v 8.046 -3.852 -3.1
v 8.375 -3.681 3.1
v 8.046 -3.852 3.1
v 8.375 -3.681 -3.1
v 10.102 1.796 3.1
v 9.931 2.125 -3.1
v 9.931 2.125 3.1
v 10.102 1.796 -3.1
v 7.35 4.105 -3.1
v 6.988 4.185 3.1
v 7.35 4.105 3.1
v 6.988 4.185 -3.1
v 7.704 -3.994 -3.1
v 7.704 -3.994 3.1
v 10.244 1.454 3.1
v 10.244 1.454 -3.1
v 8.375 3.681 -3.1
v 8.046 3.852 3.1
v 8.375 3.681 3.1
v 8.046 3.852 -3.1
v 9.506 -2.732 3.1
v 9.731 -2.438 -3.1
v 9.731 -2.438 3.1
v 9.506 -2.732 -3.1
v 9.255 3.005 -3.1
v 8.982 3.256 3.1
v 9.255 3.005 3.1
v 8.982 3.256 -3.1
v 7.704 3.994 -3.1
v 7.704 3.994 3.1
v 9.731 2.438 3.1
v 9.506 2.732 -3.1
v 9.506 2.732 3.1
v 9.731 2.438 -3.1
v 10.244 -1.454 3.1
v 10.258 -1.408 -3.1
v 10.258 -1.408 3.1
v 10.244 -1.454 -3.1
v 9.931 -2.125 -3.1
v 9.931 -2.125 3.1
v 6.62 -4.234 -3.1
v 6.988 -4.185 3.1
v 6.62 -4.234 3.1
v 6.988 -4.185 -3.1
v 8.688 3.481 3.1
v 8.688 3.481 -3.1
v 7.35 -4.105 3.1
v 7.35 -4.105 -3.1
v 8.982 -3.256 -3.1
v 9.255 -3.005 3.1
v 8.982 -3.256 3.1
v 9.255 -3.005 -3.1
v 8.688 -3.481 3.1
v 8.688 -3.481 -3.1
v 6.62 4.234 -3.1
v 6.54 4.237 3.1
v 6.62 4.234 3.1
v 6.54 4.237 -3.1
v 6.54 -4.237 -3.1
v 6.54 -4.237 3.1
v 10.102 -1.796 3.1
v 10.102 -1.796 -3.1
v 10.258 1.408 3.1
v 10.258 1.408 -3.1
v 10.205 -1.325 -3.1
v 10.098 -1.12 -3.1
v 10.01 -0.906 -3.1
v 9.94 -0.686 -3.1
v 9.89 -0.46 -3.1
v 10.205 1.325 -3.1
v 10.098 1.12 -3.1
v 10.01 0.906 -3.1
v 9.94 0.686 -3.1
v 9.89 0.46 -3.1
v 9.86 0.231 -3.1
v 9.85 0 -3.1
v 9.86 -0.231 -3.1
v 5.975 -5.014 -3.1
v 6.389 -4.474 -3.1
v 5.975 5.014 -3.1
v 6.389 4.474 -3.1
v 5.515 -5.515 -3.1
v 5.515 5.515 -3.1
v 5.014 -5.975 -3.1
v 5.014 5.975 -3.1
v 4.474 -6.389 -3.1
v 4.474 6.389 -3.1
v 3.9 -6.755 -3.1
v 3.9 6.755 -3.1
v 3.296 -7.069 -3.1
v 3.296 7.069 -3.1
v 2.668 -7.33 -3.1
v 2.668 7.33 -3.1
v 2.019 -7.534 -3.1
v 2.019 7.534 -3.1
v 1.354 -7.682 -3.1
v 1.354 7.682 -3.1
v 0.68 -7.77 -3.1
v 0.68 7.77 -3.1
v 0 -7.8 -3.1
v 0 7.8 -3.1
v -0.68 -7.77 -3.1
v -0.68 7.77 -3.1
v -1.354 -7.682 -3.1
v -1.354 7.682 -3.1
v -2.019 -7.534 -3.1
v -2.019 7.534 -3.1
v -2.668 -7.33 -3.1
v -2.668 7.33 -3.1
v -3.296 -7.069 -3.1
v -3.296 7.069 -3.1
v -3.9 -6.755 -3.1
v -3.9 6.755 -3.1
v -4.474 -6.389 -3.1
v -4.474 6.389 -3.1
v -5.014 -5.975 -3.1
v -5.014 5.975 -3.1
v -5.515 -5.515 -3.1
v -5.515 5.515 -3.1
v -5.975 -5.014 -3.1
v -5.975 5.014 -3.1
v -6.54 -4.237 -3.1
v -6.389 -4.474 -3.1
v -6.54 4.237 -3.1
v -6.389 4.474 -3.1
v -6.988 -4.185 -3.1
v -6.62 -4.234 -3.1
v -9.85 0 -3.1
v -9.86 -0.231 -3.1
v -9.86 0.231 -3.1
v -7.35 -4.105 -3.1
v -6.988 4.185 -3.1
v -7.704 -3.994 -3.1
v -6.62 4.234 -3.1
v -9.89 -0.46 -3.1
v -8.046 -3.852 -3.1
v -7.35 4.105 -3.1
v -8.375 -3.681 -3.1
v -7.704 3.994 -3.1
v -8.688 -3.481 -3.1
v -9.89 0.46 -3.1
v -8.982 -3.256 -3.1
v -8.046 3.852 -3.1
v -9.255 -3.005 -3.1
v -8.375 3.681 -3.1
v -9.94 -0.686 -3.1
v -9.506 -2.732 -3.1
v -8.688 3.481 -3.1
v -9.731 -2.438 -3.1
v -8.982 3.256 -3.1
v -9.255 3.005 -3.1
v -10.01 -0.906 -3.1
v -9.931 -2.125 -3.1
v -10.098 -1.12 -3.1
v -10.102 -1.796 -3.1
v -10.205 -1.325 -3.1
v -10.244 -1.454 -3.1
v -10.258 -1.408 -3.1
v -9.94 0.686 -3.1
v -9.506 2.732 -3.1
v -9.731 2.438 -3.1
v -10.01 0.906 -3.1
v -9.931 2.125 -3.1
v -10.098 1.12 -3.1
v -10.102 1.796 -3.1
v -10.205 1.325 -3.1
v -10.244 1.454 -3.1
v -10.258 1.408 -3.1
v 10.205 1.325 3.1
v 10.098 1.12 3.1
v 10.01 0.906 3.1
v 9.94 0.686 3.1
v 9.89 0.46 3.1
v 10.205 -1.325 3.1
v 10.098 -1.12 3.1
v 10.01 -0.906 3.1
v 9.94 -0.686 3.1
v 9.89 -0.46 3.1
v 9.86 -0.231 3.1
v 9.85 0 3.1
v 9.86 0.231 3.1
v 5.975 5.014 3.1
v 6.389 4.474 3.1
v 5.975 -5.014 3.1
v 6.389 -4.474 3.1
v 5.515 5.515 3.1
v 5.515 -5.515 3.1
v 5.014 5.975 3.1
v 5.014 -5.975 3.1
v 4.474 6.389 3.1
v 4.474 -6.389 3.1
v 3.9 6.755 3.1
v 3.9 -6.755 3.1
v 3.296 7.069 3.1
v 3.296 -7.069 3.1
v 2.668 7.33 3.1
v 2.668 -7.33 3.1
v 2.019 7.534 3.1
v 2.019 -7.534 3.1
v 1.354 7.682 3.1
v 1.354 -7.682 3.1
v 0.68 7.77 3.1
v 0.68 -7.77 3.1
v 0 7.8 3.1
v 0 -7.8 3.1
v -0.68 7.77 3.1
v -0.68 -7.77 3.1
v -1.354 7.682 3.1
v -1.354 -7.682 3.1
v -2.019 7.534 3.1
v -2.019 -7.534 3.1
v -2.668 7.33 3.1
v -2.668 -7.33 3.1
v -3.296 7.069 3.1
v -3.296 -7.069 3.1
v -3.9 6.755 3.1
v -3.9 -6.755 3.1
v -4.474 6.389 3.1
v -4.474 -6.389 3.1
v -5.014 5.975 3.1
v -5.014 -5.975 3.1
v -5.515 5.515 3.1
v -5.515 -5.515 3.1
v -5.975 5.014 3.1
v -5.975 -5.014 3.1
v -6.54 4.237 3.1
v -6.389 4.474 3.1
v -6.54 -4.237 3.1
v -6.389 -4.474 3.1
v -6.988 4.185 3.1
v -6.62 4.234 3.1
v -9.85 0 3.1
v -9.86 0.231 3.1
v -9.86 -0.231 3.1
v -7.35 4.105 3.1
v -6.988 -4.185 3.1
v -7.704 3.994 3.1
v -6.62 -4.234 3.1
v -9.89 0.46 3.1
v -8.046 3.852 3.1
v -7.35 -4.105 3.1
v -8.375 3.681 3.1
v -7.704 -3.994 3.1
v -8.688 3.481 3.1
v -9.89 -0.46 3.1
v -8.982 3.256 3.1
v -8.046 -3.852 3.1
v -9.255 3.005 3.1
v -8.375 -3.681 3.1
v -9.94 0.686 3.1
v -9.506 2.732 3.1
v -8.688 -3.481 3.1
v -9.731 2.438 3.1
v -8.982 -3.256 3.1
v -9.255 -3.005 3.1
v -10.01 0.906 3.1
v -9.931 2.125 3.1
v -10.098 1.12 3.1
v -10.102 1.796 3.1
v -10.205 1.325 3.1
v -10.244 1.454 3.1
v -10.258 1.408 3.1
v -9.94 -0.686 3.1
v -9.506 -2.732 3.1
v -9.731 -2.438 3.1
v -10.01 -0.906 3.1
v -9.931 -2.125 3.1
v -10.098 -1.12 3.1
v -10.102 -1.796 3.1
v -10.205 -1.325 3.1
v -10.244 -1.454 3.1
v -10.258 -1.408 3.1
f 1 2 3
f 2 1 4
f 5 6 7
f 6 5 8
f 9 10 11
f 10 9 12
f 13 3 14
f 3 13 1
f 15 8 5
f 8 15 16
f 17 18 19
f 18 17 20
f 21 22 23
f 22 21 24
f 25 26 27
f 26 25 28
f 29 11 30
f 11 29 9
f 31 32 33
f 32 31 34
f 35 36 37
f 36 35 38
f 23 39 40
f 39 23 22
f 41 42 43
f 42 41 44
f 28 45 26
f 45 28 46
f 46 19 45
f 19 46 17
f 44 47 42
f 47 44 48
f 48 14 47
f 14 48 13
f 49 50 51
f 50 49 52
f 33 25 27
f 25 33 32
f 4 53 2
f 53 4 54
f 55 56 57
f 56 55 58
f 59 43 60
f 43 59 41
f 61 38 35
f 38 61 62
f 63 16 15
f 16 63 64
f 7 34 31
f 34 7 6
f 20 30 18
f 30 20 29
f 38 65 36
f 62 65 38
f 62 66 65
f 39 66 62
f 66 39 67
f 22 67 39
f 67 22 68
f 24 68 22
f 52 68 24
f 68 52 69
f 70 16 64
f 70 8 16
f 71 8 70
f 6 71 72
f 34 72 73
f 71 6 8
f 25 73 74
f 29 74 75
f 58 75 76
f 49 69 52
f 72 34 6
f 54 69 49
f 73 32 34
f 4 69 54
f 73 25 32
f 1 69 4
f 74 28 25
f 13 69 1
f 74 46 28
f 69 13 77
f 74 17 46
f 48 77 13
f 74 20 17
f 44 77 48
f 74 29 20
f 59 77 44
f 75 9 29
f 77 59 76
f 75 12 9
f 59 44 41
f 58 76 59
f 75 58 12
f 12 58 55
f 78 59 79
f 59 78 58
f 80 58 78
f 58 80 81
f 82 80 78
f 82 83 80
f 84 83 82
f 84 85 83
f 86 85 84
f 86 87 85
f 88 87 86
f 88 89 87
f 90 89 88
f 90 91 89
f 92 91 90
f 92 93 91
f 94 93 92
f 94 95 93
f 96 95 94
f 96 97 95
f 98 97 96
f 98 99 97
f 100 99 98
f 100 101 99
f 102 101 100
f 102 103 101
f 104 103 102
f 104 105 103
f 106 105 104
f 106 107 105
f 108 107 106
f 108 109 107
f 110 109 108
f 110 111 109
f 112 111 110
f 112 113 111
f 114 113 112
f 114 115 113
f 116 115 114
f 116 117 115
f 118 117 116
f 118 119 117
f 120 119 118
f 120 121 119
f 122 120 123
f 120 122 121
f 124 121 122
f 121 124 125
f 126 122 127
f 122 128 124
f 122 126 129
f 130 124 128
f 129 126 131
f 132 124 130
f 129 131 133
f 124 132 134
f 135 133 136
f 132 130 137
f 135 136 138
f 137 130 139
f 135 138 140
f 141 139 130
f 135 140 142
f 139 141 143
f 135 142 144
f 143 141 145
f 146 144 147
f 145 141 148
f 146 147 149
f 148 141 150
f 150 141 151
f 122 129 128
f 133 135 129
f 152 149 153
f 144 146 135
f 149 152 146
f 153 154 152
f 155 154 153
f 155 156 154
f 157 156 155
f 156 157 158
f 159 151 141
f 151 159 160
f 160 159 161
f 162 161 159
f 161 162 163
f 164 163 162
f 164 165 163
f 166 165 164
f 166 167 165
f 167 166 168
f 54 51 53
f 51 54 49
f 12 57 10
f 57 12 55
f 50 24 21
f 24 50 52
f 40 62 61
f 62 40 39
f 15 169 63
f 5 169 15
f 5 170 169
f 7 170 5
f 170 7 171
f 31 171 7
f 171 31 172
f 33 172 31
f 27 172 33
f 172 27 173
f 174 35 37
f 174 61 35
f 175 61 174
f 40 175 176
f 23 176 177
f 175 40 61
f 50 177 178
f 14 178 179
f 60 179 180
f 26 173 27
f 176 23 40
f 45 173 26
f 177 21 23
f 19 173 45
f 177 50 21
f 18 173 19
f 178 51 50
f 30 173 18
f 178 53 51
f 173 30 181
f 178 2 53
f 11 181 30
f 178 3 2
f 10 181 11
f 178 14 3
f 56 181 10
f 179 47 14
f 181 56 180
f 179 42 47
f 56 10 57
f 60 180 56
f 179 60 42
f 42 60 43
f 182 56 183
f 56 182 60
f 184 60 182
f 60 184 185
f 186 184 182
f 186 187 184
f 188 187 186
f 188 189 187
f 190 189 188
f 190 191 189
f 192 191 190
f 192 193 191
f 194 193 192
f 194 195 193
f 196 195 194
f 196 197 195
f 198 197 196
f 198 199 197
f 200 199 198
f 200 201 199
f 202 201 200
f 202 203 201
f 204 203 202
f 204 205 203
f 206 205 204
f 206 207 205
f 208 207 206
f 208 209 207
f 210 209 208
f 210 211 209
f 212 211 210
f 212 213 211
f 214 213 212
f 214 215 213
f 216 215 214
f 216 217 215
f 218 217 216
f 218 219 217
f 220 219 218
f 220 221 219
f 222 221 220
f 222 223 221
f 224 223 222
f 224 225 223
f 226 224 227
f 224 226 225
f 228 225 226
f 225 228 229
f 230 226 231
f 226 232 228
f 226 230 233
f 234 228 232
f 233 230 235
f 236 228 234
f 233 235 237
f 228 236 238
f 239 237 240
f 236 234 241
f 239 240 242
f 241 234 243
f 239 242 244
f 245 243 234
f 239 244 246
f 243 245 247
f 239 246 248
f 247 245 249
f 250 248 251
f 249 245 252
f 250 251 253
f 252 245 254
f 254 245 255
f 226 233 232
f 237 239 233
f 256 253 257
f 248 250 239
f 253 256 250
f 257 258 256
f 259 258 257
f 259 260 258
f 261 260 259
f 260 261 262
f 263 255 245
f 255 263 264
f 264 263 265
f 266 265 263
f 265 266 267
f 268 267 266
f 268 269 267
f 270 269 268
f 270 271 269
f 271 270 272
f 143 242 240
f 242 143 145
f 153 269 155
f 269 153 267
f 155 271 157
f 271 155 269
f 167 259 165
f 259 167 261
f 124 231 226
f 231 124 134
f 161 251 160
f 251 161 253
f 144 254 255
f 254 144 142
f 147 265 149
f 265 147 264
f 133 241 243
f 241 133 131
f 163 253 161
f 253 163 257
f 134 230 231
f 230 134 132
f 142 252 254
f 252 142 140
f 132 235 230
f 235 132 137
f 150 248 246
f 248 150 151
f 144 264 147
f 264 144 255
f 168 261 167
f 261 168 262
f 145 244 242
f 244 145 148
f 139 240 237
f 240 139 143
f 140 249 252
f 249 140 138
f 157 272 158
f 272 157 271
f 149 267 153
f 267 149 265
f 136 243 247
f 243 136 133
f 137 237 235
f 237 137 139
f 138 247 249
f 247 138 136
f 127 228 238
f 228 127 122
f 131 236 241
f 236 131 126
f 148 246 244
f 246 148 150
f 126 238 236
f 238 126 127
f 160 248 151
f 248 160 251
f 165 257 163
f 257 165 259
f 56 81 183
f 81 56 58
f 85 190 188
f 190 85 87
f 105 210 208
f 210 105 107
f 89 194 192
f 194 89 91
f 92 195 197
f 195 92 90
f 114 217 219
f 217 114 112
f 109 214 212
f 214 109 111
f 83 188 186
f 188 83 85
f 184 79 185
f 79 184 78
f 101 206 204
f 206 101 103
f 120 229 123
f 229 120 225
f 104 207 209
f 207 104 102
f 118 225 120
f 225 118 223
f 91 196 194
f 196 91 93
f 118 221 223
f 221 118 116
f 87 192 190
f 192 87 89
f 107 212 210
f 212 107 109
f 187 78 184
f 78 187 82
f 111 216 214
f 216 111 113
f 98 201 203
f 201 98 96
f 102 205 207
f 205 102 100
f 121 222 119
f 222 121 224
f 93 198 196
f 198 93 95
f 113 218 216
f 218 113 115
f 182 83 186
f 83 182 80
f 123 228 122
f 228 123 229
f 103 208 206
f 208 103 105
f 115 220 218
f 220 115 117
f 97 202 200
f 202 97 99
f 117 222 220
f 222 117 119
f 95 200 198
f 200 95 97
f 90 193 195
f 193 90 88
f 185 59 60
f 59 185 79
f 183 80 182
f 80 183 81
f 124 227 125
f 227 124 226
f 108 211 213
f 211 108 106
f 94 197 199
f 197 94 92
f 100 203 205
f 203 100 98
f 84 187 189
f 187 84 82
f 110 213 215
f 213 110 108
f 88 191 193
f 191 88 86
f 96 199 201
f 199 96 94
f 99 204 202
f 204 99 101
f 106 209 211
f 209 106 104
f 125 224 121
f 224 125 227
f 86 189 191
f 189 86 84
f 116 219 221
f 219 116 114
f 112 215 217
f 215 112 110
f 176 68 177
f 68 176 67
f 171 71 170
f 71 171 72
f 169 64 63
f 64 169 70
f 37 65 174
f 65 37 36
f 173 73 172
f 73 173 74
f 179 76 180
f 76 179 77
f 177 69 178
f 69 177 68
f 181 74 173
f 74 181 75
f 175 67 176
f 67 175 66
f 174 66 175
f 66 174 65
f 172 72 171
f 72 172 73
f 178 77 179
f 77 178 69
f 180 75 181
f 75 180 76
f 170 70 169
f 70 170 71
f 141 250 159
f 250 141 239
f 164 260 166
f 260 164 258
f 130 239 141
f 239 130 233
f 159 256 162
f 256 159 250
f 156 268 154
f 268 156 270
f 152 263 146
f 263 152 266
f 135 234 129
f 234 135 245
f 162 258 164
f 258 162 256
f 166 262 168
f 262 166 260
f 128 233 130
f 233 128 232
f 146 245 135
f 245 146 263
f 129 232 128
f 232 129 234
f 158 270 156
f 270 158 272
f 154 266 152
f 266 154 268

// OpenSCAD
$fn = 72;

thickness = 6.2;
hub_r = 7.8;
arm_r = 4.25;
port_dist = 12.5;
hole_r = 2.65;

module connector_2way_straight() {
  difference() {
    union() {
      cylinder(h=thickness, r=hub_r, center=true);
      
      // two opposite arms
      for (a = [0, 180]) {
        rotate([0,0,a])
          translate([port_dist/2, 0, 0])
            cylinder(h=thickness, r=arm_r, center=true);
      }
    }
    
    for (a = [0, 180]) {
      rotate([0,0,a])
        translate([port_dist, 0, 0])
          cylinder(h=thickness+2, r=hole_r, center=true);
    }
  }
}

connector_2way_straight();
